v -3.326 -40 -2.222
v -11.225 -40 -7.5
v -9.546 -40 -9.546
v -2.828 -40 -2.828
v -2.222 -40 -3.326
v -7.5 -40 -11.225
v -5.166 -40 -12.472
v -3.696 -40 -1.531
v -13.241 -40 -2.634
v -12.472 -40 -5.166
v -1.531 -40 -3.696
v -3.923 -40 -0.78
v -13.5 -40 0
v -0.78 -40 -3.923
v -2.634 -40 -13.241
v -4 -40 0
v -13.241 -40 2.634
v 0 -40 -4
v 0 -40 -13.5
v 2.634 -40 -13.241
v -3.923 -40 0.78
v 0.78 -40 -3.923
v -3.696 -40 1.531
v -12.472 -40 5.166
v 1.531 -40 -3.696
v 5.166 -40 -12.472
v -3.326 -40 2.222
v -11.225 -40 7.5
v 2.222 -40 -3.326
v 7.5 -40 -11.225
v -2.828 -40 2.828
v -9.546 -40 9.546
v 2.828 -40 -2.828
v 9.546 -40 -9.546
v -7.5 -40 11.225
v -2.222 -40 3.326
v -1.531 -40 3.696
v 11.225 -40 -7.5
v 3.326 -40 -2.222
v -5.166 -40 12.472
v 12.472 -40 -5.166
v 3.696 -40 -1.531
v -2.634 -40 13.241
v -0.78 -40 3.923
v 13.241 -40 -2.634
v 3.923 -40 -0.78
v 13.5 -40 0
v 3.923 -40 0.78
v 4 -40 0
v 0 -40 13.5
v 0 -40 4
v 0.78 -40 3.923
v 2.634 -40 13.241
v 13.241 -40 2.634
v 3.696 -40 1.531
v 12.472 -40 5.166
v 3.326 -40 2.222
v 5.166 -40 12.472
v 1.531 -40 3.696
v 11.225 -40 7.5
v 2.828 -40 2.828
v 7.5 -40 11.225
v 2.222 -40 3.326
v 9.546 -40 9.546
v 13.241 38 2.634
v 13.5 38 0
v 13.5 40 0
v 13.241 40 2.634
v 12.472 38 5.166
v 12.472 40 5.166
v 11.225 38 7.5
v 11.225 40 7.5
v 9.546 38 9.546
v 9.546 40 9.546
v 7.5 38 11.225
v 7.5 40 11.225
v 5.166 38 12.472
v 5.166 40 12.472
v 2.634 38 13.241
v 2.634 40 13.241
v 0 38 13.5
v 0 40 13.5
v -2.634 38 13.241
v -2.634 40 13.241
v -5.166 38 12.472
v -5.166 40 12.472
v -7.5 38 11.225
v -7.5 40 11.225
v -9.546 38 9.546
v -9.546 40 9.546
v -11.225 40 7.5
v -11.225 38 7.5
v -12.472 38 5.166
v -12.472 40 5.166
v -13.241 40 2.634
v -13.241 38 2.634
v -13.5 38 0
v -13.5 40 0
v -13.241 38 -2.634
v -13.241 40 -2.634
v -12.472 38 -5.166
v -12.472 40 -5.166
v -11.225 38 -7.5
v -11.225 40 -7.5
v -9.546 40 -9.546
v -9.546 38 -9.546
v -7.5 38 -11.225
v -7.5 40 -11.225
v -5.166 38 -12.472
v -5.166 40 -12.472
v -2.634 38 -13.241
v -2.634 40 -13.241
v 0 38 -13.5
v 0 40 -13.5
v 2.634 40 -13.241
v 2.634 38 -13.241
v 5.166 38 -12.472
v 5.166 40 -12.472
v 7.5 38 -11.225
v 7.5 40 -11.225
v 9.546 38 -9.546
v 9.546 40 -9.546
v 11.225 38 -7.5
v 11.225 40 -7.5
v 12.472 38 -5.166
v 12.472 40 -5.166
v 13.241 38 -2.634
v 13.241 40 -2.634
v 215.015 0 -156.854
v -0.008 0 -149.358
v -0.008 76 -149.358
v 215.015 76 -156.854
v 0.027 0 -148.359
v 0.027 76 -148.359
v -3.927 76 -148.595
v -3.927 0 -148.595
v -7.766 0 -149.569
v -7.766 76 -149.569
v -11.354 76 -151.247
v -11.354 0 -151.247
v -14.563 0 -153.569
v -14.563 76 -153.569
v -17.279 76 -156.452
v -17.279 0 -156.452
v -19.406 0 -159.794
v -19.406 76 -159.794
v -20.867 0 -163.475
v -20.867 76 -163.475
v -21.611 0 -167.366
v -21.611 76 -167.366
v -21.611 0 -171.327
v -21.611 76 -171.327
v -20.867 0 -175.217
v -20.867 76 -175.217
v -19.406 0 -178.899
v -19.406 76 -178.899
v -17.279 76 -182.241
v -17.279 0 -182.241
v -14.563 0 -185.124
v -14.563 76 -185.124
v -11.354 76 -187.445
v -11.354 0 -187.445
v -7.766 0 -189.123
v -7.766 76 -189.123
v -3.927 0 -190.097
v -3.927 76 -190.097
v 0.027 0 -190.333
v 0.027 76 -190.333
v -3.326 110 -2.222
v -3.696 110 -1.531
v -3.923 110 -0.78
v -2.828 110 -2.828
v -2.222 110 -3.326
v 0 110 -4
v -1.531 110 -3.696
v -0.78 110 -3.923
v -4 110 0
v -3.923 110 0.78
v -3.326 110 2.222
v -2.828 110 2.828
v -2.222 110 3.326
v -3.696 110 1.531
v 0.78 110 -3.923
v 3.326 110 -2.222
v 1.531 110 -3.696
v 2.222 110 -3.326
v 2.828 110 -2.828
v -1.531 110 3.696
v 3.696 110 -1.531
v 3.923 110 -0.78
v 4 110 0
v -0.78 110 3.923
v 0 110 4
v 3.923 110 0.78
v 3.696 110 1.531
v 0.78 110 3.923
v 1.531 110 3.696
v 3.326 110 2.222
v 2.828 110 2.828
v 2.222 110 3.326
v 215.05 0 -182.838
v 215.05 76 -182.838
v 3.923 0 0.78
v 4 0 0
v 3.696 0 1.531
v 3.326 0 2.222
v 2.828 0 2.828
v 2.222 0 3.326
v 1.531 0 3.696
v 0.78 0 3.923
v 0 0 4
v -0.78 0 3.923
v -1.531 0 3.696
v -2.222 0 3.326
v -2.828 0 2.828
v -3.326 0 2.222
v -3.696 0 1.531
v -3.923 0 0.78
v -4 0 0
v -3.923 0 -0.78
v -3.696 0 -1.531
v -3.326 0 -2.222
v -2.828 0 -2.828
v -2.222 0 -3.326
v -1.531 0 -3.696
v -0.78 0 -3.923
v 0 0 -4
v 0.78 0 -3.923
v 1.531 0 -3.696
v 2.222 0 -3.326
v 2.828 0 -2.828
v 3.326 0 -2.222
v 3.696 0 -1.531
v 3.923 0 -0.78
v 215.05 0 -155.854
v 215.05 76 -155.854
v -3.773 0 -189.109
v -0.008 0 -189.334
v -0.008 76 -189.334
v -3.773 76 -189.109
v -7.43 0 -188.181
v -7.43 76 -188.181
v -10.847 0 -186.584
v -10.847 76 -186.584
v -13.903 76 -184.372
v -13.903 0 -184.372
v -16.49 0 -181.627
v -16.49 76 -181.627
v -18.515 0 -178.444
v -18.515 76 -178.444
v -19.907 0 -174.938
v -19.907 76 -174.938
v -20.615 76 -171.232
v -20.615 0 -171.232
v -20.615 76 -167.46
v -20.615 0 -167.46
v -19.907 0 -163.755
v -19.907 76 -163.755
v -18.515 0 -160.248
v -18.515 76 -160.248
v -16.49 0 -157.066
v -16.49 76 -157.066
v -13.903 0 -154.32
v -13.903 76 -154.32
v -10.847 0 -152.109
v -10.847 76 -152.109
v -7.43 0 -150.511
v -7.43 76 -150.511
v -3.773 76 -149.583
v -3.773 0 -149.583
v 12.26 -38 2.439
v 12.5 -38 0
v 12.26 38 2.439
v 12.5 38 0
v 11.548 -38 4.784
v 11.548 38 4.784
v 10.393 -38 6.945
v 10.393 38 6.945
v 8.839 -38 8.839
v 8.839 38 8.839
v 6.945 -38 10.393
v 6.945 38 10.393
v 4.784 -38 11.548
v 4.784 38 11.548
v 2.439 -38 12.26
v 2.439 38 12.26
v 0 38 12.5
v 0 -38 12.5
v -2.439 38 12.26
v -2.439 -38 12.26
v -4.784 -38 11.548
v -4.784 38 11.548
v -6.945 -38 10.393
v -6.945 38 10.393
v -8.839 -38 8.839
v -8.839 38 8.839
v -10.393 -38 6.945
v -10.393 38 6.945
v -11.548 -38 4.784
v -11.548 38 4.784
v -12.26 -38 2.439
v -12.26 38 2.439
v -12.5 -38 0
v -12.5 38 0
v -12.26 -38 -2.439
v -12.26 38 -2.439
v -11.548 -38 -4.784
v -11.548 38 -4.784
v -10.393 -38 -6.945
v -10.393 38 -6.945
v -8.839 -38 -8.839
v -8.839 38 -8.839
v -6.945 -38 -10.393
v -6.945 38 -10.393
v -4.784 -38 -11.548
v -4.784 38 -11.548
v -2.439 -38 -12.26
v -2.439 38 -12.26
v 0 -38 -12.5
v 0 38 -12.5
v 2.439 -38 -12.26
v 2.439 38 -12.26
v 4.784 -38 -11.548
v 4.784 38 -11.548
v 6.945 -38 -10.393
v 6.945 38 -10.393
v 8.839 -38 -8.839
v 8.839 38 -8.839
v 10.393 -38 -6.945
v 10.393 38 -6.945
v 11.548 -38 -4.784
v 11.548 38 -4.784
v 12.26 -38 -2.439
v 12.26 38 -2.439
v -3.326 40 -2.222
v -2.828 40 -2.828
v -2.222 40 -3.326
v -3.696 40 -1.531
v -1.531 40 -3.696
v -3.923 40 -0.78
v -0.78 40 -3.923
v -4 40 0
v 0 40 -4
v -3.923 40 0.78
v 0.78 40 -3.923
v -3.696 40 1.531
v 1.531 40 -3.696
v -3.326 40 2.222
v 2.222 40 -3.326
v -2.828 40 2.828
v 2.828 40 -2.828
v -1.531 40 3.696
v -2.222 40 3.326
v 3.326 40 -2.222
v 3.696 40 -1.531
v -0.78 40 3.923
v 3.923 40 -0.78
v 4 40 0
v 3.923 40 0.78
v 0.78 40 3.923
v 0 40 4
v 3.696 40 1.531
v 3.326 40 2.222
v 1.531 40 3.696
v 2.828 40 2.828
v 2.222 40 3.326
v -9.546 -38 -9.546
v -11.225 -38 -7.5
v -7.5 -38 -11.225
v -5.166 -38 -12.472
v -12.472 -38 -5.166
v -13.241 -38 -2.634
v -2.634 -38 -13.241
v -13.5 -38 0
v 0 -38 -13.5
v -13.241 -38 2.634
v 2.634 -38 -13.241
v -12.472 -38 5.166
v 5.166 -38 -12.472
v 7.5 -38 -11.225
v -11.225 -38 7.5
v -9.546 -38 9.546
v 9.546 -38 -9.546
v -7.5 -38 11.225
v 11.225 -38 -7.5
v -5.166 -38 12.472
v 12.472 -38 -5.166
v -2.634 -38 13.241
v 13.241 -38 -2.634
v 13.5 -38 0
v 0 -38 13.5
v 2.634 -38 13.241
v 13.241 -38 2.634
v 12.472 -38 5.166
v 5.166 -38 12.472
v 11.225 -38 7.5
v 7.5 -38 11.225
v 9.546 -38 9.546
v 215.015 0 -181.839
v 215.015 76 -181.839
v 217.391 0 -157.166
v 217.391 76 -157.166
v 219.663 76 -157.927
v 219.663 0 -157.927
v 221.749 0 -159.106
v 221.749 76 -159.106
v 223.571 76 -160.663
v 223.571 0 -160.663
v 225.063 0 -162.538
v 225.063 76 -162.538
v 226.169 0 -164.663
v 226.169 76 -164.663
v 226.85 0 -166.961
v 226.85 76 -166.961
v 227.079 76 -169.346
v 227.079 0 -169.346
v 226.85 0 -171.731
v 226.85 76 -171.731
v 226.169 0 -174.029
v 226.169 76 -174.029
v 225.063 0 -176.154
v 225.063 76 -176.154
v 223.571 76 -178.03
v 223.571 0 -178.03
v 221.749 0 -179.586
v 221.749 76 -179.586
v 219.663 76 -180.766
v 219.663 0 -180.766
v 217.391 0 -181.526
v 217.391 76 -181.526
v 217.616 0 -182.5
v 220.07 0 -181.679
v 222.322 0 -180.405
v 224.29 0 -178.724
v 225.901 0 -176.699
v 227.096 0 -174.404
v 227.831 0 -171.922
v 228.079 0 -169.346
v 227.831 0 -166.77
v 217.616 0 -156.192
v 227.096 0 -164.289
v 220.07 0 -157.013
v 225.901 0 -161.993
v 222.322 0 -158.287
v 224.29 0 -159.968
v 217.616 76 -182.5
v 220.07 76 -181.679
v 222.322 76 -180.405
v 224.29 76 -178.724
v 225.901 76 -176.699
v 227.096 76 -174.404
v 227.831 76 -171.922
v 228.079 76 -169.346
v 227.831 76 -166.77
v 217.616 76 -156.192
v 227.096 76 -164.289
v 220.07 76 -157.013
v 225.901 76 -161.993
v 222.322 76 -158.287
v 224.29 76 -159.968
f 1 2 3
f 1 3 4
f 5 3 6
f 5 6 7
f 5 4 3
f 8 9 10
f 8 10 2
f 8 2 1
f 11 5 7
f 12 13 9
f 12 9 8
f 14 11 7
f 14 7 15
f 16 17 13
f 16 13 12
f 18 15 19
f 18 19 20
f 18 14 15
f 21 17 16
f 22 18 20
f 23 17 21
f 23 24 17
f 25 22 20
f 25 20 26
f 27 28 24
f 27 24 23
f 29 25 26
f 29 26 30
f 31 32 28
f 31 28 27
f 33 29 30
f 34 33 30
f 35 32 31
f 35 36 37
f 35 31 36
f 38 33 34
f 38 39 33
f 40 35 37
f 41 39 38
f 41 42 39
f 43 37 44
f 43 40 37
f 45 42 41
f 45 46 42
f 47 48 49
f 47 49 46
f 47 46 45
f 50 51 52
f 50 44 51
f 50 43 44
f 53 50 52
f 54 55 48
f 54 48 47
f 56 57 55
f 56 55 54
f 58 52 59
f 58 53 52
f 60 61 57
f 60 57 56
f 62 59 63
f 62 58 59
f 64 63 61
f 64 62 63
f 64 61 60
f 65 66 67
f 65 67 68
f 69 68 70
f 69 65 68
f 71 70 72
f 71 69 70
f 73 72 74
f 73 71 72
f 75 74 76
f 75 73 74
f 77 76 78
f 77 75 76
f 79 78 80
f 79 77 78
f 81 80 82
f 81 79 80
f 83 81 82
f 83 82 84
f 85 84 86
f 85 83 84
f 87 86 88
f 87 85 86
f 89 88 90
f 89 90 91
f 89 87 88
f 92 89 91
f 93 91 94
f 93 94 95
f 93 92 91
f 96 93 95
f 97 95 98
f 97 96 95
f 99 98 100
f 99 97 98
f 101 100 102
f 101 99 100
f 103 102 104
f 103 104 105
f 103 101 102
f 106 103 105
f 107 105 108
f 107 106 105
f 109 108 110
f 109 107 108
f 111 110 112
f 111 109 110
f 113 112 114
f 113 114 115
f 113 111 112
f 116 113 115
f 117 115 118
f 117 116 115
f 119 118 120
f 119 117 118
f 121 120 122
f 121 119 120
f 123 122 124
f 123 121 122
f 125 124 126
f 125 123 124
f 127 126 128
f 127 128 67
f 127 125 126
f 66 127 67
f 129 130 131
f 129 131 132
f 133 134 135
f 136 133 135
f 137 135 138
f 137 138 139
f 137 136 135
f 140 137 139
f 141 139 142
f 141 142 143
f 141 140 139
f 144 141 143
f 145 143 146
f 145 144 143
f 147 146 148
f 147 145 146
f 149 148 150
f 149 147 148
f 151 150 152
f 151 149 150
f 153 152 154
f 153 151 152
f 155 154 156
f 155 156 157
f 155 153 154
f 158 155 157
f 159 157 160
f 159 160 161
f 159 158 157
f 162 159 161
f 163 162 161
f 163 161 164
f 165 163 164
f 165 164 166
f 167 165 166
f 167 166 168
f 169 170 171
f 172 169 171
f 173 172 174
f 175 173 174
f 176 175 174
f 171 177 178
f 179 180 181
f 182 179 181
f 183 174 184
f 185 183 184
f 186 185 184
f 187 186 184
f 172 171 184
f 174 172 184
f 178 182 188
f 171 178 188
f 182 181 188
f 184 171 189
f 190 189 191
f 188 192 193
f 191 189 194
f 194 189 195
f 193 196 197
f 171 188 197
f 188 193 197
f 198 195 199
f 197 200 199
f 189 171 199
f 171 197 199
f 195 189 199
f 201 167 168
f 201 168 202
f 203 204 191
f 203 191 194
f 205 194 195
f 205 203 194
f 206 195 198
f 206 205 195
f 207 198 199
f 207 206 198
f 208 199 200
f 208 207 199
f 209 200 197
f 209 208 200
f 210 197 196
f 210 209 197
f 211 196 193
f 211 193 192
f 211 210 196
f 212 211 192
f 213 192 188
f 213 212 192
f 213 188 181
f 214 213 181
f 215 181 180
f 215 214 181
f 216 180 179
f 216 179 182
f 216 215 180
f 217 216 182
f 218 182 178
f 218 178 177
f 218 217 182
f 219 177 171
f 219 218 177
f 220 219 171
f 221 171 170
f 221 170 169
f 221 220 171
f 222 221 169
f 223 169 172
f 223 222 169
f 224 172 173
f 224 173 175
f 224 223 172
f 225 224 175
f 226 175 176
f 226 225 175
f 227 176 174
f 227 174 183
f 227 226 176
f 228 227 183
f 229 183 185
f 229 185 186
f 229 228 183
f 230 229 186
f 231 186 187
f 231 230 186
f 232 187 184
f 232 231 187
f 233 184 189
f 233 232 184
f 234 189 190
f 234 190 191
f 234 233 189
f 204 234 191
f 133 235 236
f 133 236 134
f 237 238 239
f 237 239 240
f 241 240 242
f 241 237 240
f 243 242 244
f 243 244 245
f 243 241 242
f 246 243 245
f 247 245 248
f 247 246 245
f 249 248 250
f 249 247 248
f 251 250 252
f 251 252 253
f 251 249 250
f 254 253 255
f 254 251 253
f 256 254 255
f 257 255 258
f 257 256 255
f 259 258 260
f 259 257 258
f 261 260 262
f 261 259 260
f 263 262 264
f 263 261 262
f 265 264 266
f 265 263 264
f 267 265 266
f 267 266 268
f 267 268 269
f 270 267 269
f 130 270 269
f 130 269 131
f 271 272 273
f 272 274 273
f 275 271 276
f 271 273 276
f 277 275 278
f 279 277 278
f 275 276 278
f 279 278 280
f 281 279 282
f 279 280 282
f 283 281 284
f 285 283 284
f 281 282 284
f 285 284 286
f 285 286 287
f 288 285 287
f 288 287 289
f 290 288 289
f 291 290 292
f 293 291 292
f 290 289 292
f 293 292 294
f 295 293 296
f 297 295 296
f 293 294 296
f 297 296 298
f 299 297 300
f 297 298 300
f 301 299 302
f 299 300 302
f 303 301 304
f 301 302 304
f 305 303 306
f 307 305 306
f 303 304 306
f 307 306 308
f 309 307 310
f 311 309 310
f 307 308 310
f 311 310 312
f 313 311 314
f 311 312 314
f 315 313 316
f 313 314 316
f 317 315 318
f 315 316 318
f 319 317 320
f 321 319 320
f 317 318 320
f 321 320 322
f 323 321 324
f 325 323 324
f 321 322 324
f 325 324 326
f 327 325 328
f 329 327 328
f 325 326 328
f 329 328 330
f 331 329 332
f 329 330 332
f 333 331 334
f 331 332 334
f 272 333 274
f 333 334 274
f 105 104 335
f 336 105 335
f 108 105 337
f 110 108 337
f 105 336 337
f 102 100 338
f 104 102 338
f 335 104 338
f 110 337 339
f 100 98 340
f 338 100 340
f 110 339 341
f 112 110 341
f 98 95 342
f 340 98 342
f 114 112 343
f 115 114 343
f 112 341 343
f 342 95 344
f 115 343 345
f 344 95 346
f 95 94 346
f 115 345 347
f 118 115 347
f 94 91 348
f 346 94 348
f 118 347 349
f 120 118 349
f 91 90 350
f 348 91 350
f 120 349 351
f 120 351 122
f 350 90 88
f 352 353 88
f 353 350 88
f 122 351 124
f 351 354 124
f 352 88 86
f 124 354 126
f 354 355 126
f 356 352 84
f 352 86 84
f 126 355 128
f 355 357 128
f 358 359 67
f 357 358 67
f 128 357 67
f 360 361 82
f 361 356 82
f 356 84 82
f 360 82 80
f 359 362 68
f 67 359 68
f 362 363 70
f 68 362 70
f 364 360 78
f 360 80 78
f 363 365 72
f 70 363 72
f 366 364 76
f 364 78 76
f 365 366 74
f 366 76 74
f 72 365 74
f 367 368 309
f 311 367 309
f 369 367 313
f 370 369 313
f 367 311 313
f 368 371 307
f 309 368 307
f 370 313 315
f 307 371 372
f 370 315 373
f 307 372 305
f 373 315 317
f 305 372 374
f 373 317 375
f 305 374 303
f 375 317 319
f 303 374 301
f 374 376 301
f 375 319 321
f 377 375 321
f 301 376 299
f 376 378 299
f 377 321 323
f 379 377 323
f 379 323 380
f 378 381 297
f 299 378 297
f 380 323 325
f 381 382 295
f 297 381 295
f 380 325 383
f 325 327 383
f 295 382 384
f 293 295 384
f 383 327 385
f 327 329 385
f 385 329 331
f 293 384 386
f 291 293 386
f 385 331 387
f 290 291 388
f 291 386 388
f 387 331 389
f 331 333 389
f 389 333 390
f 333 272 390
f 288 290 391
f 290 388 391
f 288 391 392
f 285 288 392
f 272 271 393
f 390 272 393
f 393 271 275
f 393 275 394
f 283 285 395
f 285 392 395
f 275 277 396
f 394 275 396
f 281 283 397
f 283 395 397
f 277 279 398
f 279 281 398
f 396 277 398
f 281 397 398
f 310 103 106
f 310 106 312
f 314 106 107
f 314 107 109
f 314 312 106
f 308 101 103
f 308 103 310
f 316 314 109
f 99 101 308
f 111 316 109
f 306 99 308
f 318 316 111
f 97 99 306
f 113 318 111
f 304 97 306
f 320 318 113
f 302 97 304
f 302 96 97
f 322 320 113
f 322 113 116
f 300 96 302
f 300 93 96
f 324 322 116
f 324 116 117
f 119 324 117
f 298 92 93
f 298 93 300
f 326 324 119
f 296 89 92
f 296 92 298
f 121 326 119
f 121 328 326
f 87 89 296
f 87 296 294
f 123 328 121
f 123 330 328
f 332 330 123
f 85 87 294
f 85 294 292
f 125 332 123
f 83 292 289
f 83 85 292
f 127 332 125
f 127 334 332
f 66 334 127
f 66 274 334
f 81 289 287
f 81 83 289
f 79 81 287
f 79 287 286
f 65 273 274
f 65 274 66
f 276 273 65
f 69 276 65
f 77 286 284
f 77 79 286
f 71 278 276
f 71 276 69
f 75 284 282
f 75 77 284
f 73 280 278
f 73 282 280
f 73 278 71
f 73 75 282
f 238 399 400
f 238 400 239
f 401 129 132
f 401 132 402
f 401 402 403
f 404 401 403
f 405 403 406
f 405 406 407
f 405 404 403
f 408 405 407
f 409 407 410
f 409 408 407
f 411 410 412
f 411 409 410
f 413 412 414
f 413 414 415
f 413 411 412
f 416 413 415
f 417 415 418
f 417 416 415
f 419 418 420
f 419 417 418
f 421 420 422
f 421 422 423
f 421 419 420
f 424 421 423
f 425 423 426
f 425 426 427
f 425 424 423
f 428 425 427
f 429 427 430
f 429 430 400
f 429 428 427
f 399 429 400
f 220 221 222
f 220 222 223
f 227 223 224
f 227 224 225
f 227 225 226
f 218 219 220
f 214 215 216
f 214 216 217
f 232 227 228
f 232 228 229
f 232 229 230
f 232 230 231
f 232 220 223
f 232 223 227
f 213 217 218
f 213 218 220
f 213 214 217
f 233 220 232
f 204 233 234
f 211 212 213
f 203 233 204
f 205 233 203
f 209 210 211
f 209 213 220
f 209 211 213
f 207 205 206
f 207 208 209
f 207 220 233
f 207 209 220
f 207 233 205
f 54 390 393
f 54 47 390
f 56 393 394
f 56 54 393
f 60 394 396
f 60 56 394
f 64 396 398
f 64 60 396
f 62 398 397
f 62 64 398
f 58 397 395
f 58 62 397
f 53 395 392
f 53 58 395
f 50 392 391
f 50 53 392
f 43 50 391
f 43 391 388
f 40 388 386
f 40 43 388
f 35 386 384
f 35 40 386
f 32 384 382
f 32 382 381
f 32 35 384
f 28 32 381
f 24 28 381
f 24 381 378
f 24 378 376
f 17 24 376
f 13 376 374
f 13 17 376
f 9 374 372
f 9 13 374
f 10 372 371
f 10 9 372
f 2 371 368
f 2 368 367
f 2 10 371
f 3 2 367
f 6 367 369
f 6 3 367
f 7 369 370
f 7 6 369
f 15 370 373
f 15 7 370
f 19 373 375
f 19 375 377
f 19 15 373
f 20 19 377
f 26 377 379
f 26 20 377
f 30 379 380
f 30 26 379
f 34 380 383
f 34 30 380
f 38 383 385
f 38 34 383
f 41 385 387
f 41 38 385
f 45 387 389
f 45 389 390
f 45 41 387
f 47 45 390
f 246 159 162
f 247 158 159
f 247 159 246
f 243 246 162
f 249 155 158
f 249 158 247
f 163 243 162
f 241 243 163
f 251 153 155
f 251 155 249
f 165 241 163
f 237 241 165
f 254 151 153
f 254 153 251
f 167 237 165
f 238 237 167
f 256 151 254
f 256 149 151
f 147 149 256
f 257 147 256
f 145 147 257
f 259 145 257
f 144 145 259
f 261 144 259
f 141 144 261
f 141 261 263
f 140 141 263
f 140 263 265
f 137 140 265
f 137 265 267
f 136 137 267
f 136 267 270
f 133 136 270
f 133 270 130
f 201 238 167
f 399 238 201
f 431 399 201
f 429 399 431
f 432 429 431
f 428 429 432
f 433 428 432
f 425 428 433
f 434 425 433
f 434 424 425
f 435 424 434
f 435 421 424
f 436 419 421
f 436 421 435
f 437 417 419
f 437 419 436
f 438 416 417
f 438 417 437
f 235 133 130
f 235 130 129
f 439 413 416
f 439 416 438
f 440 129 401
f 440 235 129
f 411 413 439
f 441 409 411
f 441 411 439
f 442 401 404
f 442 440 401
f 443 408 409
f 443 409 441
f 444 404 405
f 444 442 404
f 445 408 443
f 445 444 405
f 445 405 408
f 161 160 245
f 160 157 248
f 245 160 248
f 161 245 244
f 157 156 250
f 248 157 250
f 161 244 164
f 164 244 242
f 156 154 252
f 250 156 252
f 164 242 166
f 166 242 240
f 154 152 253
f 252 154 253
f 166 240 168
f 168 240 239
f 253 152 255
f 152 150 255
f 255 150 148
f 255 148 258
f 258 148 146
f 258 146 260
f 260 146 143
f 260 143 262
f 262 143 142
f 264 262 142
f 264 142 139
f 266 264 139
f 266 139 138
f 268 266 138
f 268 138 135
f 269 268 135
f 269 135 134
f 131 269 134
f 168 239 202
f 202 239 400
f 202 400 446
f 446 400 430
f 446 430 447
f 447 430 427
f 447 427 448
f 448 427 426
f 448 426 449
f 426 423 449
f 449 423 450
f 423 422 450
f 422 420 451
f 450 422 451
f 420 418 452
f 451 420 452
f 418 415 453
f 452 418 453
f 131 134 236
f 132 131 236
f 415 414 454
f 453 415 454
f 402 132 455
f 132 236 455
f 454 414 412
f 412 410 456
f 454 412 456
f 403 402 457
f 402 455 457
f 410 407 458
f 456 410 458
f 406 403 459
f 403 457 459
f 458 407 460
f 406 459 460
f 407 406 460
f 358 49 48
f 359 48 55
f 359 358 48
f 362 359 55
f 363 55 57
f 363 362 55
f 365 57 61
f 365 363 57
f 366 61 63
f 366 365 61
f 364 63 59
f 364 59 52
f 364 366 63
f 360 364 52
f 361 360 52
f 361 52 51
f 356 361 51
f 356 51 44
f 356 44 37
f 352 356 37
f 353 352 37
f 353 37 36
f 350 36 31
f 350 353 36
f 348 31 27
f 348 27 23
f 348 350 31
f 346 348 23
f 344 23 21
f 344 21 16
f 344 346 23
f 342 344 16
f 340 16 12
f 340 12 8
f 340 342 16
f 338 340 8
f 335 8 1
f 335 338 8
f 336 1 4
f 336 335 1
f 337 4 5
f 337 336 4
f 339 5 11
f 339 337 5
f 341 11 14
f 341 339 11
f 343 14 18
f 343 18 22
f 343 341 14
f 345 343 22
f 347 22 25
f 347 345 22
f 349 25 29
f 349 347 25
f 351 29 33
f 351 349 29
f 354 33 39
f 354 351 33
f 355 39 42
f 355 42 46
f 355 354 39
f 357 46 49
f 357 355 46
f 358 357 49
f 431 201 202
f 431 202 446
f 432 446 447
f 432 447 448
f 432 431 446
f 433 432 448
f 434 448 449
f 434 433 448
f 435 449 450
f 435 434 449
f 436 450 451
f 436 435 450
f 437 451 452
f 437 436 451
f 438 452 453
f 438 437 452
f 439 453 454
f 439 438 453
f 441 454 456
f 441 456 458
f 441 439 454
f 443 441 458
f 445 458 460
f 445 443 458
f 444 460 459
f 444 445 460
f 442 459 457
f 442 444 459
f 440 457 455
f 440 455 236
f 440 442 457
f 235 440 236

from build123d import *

# Parameters (mm, degrees)
F0_R     = 13.5
F0_R_2   = 12.5
F0_R_3   = 4
F1_DEPTH = 40
F2_DEPTH = 38
F3_DEPTH = 76
F4_DEPTH = 110


with BuildPart() as f1:
    # F0 (on Front) → F1 (new body, symmetric)
    with BuildSketch(Plane.XZ):
        Circle(F0_R)
        Circle(F0_R_2, mode=Mode.SUBTRACT)
        Circle(F0_R_2)
        Circle(F0_R_3, mode=Mode.SUBTRACT)
    extrude(amount=F1_DEPTH, both=True)

    # F0 (on Front) → F2 (cut, symmetric)
    with BuildSketch(Plane.XZ):
        Circle(F0_R)
        Circle(F0_R_2, mode=Mode.SUBTRACT)
    extrude(amount=F2_DEPTH, both=True, mode=Mode.SUBTRACT)


with BuildPart() as f3:
    # F0 (on Front) → F3 (new body)
    with BuildSketch(Plane.XZ):
        with BuildLine():
            Line((215.049728069, -155.8543669152), (0.0273299848, -148.3589195562))
            ThreePointArc((0.0273299848, -148.3589195562), (-21.7042628563, -169.3461721614), (0.0273299848, -190.3334247667))
            Line((0.0273299848, -190.3334247667), (215.049728069, -182.8379774077))
            ThreePointArc((215.049728069, -182.8379774077), (228.0794183855, -169.3461721614), (215.049728069, -155.8543669152))
        make_face()
        with BuildLine():
            ThreePointArc((-0.0075077695, -189.3340317855), (-20.7042628563, -169.3461721614), (-0.0075077695, -149.3583125374))
            Line((-0.0075077695, -149.3583125374), (215.0148903147, -156.8537598964))
            ThreePointArc((215.0148903147, -156.8537598964), (227.0794183855, -169.3461721614), (215.0148903147, -181.8385844265))
            Line((215.0148903147, -181.8385844265), (-0.0075077695, -189.3340317855))
        make_face(mode=Mode.SUBTRACT)
    extrude(amount=-F3_DEPTH)


with BuildPart() as f4:
    # F0 (on Front) → F4 (new body)
    with BuildSketch(Plane.XZ):
        Circle(F0_R_3)
    extrude(amount=-F4_DEPTH)


solid = Compound([f1.part, f3.part, f4.part])
